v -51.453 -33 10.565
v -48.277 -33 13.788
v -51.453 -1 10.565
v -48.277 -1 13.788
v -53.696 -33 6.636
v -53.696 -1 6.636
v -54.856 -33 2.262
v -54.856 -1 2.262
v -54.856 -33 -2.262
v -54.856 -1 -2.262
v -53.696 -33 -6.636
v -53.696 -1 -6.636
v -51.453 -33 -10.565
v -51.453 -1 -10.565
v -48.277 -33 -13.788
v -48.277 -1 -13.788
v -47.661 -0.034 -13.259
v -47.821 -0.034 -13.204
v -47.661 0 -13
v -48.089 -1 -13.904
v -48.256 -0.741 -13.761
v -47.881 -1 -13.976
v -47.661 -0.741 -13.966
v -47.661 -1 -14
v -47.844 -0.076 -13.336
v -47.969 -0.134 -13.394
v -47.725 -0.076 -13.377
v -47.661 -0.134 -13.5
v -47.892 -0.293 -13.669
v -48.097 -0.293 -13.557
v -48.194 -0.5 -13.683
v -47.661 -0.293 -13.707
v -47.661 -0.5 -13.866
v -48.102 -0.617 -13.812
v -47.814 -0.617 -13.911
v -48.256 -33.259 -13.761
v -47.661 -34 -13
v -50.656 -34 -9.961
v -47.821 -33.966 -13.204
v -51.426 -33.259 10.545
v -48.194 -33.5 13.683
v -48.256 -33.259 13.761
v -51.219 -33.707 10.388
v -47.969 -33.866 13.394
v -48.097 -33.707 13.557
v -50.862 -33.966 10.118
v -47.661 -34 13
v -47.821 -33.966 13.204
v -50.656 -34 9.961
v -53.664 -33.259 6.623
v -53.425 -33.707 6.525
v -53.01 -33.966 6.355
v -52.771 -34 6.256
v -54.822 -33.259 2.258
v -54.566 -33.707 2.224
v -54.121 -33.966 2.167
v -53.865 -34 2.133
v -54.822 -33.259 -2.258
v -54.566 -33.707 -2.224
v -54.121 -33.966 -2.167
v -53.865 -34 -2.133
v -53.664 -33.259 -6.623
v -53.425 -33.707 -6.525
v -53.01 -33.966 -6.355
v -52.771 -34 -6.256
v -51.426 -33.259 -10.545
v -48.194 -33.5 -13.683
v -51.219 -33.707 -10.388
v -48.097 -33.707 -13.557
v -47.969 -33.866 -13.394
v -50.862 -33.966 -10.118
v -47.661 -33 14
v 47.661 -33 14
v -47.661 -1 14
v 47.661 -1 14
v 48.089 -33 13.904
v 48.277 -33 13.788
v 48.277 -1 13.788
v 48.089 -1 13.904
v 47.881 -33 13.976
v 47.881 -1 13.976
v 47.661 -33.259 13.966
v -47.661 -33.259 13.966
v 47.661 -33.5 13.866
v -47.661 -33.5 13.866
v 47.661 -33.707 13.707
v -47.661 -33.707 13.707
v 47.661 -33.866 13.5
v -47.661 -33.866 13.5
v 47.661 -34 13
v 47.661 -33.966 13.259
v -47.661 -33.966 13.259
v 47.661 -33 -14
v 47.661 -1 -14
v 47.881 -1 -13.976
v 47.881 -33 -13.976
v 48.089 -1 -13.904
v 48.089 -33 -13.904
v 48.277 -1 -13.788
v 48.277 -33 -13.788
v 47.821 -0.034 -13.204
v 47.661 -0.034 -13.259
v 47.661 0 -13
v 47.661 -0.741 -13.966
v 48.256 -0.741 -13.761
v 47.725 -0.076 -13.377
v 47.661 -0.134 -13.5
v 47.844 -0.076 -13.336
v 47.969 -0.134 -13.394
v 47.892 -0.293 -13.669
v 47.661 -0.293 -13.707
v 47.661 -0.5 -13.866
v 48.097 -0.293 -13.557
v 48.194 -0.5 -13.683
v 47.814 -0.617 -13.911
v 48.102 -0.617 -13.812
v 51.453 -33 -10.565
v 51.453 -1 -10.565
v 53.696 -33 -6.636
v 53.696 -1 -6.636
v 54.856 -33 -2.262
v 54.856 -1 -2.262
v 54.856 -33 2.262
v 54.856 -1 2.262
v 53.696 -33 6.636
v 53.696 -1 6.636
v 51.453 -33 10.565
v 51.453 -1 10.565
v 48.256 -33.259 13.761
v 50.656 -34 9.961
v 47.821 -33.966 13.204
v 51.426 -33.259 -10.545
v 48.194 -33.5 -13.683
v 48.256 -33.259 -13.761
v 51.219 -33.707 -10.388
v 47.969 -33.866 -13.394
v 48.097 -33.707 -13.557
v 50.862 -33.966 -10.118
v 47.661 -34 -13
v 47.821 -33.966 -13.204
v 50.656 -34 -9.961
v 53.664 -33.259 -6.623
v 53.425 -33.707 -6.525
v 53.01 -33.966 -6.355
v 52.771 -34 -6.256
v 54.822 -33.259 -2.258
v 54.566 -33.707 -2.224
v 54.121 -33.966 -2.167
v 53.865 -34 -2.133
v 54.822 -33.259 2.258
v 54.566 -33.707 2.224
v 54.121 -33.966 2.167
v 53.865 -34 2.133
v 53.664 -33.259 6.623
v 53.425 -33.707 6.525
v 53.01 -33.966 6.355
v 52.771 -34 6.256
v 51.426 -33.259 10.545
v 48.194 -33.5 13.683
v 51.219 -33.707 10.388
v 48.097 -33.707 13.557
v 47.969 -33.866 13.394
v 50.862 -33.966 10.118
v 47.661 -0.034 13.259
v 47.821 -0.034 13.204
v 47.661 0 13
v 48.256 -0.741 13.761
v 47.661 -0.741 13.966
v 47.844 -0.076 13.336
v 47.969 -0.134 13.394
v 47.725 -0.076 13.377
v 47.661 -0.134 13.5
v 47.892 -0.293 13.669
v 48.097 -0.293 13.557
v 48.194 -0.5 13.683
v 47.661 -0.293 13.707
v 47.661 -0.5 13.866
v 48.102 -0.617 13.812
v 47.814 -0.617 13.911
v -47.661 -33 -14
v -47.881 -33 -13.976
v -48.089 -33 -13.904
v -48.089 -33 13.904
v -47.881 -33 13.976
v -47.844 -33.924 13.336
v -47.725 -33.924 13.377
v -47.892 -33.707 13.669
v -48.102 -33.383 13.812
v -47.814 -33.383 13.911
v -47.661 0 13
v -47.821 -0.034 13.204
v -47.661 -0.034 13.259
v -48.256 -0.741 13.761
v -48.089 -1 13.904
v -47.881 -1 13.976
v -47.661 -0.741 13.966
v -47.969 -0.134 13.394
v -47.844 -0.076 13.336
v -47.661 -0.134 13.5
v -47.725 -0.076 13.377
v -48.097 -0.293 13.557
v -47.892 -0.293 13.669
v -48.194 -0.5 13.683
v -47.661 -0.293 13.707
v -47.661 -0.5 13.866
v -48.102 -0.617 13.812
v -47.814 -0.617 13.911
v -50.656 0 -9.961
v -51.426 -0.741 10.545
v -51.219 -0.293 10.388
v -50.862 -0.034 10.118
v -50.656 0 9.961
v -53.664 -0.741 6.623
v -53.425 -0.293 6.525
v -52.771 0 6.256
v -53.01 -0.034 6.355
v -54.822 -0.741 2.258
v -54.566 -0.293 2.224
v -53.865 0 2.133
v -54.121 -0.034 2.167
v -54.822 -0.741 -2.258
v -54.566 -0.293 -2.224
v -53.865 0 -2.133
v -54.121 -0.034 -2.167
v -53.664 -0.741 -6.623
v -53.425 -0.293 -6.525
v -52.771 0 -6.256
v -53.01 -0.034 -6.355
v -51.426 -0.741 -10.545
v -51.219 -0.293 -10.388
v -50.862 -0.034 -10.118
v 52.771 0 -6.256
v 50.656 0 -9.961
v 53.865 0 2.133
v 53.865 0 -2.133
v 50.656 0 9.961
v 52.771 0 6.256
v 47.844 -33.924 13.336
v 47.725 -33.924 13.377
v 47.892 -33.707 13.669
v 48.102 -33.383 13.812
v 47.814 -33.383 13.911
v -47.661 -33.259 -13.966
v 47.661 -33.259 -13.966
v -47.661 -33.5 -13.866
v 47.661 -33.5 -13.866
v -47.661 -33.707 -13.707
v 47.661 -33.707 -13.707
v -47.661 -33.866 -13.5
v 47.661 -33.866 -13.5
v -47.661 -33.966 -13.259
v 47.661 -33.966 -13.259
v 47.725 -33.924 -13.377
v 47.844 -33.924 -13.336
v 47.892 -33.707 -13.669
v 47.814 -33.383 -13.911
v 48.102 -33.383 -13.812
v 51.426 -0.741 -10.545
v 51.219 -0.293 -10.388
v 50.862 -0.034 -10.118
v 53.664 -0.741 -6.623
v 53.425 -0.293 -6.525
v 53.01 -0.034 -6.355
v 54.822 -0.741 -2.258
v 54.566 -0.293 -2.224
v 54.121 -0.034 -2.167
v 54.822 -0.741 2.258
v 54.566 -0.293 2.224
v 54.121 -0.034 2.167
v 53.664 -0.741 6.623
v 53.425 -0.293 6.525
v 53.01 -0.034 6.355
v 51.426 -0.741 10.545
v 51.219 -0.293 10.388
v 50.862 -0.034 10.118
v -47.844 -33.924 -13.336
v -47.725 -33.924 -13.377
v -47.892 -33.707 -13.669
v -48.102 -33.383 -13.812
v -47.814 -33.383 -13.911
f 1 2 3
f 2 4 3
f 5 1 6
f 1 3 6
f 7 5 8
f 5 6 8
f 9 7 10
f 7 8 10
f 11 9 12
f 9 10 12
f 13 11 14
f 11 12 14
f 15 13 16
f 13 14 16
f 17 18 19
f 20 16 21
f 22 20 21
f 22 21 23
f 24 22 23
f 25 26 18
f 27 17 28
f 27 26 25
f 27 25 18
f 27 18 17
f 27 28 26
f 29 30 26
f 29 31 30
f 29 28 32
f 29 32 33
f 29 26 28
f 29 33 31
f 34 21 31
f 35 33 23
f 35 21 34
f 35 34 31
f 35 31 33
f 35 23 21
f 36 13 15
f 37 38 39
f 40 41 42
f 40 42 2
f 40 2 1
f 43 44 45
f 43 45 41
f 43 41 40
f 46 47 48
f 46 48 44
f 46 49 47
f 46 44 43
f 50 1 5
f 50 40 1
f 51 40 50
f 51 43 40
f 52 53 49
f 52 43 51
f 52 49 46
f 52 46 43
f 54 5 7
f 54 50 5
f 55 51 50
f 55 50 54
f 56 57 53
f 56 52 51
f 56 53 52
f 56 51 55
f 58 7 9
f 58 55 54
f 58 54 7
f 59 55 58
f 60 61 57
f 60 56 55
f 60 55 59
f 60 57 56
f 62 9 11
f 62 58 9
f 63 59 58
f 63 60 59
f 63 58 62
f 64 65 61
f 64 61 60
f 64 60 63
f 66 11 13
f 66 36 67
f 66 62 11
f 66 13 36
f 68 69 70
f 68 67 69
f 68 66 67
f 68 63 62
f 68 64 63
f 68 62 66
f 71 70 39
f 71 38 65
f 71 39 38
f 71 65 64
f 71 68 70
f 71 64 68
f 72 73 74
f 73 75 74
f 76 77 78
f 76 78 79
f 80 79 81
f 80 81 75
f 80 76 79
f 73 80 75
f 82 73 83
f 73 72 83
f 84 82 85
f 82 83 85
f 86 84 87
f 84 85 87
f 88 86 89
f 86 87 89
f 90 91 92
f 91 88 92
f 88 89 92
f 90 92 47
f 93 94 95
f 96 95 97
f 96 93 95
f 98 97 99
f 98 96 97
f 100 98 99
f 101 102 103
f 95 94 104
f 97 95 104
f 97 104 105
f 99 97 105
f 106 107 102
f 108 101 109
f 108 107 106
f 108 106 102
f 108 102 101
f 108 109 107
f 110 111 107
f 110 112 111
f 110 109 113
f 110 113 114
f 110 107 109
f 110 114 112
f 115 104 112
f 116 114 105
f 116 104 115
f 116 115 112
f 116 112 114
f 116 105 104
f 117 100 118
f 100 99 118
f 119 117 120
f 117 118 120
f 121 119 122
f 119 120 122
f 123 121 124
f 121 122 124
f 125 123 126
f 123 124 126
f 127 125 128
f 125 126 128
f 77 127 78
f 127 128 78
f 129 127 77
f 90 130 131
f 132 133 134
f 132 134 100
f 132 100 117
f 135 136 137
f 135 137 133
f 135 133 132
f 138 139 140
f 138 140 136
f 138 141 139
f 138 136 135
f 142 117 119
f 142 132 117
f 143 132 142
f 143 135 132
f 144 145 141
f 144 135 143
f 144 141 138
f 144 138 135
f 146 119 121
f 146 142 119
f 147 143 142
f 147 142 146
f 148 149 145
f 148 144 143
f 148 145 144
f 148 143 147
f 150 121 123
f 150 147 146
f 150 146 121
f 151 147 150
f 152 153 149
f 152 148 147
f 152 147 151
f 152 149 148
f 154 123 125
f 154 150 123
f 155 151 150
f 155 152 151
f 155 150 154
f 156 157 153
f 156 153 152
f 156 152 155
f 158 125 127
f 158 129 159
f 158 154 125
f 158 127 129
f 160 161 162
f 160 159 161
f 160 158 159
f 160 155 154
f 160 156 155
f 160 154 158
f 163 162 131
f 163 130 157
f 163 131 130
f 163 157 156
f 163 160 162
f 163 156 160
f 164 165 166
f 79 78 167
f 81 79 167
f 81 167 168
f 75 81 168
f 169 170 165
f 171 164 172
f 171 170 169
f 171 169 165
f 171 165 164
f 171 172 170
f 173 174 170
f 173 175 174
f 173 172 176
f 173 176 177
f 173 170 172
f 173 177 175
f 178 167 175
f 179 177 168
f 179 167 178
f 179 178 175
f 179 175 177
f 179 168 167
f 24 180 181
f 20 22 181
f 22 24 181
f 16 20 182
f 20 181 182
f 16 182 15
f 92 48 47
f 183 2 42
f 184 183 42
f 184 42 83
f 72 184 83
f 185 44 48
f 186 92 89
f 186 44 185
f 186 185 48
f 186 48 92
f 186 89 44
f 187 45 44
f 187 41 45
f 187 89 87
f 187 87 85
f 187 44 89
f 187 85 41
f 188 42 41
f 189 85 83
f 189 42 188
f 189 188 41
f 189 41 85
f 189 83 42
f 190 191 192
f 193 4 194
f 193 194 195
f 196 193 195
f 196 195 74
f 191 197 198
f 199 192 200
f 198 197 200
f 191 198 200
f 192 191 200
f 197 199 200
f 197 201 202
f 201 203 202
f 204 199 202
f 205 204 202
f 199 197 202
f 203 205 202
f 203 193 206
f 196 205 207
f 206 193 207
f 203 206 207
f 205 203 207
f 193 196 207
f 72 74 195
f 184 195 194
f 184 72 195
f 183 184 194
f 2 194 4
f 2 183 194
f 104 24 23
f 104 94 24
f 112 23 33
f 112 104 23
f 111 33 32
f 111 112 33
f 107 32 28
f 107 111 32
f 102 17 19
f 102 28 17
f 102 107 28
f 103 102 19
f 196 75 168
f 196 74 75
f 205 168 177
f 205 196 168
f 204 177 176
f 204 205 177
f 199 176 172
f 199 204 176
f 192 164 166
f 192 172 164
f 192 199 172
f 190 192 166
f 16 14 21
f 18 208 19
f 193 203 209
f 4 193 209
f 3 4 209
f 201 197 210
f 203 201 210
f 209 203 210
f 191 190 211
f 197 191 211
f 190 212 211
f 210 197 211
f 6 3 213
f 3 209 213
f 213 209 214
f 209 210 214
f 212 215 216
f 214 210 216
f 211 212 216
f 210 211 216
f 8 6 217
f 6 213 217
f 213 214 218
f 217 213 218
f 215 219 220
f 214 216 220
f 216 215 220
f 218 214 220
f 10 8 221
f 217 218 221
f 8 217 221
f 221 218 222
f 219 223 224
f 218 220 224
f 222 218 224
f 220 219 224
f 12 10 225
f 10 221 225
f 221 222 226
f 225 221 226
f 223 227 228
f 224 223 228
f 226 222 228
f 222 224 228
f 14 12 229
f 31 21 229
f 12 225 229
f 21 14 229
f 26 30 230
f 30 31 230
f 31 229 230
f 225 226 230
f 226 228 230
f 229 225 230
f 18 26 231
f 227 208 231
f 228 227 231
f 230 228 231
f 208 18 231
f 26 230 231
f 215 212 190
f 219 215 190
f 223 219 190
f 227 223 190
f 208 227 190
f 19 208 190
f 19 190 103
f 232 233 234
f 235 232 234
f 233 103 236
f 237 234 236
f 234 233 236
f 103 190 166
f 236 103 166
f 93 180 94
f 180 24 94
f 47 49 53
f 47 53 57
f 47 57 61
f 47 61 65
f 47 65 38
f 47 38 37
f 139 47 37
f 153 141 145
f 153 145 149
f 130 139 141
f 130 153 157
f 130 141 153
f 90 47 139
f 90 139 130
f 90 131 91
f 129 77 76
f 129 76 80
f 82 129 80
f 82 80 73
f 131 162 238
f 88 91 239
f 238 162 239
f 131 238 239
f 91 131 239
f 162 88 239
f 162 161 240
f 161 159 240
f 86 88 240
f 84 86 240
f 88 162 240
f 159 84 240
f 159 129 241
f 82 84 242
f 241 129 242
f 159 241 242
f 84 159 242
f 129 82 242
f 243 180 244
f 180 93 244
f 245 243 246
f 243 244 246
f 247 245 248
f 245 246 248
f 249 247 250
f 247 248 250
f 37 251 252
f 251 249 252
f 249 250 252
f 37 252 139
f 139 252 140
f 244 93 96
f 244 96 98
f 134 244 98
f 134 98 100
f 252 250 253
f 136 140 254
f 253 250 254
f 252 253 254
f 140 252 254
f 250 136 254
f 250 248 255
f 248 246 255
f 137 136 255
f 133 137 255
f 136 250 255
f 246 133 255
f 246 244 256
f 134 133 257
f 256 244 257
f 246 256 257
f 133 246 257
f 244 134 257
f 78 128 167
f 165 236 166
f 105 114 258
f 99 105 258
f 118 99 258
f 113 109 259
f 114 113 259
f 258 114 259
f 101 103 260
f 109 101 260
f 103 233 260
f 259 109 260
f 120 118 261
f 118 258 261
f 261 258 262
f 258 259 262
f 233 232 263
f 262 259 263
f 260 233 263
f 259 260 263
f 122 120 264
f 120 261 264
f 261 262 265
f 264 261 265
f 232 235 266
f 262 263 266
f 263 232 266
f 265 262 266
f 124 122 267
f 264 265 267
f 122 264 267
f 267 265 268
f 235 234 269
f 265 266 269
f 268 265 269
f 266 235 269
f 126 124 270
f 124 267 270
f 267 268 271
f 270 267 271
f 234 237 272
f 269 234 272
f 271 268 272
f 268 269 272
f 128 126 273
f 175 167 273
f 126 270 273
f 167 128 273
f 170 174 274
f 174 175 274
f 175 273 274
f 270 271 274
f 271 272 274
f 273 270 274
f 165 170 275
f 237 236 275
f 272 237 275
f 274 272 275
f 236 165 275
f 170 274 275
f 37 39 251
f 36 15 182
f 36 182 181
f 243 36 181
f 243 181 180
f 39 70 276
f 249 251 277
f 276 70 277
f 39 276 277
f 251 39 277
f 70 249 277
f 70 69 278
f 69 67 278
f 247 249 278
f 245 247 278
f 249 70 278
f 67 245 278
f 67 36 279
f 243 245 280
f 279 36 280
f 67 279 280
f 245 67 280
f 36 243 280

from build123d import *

# Parameters (mm, degrees)
F1_DEPTH = 34
F2_R     = 1


with BuildPart() as f1:
    # F0 (on Front) → F1 (new body)
    with BuildSketch(Plane.XZ):
        with BuildLine():
            Line((-48, -14), (48, -14))
            ThreePointArc((48, -14), (55.003177, 0), (48, 14))
            Line((48, 14), (-48, 14))
            ThreePointArc((-48, 14), (-55.003177, 0), (-48, -14))
        make_face()
    extrude(amount=F1_DEPTH)

    # F2
    f2_edges = [f1.edges().sort_by_distance(p)[0] for p in [
        (-55.003177, -34, 0),
        (0, -34, -14),
        (55.003177, -34, 0),
        (0, -34, 14),
        (-55.003177, 0, 0),
        (0, 0, -14),
        (55.003177, 0, 0),
        (0, 0, 14),
        (48, -17, 14),
        (-48, -17, 14),
        (-48, -17, -14),
        (48, -17, -14),
    ]]
    fillet(f2_edges, radius=F2_R)


solid = f1.part
